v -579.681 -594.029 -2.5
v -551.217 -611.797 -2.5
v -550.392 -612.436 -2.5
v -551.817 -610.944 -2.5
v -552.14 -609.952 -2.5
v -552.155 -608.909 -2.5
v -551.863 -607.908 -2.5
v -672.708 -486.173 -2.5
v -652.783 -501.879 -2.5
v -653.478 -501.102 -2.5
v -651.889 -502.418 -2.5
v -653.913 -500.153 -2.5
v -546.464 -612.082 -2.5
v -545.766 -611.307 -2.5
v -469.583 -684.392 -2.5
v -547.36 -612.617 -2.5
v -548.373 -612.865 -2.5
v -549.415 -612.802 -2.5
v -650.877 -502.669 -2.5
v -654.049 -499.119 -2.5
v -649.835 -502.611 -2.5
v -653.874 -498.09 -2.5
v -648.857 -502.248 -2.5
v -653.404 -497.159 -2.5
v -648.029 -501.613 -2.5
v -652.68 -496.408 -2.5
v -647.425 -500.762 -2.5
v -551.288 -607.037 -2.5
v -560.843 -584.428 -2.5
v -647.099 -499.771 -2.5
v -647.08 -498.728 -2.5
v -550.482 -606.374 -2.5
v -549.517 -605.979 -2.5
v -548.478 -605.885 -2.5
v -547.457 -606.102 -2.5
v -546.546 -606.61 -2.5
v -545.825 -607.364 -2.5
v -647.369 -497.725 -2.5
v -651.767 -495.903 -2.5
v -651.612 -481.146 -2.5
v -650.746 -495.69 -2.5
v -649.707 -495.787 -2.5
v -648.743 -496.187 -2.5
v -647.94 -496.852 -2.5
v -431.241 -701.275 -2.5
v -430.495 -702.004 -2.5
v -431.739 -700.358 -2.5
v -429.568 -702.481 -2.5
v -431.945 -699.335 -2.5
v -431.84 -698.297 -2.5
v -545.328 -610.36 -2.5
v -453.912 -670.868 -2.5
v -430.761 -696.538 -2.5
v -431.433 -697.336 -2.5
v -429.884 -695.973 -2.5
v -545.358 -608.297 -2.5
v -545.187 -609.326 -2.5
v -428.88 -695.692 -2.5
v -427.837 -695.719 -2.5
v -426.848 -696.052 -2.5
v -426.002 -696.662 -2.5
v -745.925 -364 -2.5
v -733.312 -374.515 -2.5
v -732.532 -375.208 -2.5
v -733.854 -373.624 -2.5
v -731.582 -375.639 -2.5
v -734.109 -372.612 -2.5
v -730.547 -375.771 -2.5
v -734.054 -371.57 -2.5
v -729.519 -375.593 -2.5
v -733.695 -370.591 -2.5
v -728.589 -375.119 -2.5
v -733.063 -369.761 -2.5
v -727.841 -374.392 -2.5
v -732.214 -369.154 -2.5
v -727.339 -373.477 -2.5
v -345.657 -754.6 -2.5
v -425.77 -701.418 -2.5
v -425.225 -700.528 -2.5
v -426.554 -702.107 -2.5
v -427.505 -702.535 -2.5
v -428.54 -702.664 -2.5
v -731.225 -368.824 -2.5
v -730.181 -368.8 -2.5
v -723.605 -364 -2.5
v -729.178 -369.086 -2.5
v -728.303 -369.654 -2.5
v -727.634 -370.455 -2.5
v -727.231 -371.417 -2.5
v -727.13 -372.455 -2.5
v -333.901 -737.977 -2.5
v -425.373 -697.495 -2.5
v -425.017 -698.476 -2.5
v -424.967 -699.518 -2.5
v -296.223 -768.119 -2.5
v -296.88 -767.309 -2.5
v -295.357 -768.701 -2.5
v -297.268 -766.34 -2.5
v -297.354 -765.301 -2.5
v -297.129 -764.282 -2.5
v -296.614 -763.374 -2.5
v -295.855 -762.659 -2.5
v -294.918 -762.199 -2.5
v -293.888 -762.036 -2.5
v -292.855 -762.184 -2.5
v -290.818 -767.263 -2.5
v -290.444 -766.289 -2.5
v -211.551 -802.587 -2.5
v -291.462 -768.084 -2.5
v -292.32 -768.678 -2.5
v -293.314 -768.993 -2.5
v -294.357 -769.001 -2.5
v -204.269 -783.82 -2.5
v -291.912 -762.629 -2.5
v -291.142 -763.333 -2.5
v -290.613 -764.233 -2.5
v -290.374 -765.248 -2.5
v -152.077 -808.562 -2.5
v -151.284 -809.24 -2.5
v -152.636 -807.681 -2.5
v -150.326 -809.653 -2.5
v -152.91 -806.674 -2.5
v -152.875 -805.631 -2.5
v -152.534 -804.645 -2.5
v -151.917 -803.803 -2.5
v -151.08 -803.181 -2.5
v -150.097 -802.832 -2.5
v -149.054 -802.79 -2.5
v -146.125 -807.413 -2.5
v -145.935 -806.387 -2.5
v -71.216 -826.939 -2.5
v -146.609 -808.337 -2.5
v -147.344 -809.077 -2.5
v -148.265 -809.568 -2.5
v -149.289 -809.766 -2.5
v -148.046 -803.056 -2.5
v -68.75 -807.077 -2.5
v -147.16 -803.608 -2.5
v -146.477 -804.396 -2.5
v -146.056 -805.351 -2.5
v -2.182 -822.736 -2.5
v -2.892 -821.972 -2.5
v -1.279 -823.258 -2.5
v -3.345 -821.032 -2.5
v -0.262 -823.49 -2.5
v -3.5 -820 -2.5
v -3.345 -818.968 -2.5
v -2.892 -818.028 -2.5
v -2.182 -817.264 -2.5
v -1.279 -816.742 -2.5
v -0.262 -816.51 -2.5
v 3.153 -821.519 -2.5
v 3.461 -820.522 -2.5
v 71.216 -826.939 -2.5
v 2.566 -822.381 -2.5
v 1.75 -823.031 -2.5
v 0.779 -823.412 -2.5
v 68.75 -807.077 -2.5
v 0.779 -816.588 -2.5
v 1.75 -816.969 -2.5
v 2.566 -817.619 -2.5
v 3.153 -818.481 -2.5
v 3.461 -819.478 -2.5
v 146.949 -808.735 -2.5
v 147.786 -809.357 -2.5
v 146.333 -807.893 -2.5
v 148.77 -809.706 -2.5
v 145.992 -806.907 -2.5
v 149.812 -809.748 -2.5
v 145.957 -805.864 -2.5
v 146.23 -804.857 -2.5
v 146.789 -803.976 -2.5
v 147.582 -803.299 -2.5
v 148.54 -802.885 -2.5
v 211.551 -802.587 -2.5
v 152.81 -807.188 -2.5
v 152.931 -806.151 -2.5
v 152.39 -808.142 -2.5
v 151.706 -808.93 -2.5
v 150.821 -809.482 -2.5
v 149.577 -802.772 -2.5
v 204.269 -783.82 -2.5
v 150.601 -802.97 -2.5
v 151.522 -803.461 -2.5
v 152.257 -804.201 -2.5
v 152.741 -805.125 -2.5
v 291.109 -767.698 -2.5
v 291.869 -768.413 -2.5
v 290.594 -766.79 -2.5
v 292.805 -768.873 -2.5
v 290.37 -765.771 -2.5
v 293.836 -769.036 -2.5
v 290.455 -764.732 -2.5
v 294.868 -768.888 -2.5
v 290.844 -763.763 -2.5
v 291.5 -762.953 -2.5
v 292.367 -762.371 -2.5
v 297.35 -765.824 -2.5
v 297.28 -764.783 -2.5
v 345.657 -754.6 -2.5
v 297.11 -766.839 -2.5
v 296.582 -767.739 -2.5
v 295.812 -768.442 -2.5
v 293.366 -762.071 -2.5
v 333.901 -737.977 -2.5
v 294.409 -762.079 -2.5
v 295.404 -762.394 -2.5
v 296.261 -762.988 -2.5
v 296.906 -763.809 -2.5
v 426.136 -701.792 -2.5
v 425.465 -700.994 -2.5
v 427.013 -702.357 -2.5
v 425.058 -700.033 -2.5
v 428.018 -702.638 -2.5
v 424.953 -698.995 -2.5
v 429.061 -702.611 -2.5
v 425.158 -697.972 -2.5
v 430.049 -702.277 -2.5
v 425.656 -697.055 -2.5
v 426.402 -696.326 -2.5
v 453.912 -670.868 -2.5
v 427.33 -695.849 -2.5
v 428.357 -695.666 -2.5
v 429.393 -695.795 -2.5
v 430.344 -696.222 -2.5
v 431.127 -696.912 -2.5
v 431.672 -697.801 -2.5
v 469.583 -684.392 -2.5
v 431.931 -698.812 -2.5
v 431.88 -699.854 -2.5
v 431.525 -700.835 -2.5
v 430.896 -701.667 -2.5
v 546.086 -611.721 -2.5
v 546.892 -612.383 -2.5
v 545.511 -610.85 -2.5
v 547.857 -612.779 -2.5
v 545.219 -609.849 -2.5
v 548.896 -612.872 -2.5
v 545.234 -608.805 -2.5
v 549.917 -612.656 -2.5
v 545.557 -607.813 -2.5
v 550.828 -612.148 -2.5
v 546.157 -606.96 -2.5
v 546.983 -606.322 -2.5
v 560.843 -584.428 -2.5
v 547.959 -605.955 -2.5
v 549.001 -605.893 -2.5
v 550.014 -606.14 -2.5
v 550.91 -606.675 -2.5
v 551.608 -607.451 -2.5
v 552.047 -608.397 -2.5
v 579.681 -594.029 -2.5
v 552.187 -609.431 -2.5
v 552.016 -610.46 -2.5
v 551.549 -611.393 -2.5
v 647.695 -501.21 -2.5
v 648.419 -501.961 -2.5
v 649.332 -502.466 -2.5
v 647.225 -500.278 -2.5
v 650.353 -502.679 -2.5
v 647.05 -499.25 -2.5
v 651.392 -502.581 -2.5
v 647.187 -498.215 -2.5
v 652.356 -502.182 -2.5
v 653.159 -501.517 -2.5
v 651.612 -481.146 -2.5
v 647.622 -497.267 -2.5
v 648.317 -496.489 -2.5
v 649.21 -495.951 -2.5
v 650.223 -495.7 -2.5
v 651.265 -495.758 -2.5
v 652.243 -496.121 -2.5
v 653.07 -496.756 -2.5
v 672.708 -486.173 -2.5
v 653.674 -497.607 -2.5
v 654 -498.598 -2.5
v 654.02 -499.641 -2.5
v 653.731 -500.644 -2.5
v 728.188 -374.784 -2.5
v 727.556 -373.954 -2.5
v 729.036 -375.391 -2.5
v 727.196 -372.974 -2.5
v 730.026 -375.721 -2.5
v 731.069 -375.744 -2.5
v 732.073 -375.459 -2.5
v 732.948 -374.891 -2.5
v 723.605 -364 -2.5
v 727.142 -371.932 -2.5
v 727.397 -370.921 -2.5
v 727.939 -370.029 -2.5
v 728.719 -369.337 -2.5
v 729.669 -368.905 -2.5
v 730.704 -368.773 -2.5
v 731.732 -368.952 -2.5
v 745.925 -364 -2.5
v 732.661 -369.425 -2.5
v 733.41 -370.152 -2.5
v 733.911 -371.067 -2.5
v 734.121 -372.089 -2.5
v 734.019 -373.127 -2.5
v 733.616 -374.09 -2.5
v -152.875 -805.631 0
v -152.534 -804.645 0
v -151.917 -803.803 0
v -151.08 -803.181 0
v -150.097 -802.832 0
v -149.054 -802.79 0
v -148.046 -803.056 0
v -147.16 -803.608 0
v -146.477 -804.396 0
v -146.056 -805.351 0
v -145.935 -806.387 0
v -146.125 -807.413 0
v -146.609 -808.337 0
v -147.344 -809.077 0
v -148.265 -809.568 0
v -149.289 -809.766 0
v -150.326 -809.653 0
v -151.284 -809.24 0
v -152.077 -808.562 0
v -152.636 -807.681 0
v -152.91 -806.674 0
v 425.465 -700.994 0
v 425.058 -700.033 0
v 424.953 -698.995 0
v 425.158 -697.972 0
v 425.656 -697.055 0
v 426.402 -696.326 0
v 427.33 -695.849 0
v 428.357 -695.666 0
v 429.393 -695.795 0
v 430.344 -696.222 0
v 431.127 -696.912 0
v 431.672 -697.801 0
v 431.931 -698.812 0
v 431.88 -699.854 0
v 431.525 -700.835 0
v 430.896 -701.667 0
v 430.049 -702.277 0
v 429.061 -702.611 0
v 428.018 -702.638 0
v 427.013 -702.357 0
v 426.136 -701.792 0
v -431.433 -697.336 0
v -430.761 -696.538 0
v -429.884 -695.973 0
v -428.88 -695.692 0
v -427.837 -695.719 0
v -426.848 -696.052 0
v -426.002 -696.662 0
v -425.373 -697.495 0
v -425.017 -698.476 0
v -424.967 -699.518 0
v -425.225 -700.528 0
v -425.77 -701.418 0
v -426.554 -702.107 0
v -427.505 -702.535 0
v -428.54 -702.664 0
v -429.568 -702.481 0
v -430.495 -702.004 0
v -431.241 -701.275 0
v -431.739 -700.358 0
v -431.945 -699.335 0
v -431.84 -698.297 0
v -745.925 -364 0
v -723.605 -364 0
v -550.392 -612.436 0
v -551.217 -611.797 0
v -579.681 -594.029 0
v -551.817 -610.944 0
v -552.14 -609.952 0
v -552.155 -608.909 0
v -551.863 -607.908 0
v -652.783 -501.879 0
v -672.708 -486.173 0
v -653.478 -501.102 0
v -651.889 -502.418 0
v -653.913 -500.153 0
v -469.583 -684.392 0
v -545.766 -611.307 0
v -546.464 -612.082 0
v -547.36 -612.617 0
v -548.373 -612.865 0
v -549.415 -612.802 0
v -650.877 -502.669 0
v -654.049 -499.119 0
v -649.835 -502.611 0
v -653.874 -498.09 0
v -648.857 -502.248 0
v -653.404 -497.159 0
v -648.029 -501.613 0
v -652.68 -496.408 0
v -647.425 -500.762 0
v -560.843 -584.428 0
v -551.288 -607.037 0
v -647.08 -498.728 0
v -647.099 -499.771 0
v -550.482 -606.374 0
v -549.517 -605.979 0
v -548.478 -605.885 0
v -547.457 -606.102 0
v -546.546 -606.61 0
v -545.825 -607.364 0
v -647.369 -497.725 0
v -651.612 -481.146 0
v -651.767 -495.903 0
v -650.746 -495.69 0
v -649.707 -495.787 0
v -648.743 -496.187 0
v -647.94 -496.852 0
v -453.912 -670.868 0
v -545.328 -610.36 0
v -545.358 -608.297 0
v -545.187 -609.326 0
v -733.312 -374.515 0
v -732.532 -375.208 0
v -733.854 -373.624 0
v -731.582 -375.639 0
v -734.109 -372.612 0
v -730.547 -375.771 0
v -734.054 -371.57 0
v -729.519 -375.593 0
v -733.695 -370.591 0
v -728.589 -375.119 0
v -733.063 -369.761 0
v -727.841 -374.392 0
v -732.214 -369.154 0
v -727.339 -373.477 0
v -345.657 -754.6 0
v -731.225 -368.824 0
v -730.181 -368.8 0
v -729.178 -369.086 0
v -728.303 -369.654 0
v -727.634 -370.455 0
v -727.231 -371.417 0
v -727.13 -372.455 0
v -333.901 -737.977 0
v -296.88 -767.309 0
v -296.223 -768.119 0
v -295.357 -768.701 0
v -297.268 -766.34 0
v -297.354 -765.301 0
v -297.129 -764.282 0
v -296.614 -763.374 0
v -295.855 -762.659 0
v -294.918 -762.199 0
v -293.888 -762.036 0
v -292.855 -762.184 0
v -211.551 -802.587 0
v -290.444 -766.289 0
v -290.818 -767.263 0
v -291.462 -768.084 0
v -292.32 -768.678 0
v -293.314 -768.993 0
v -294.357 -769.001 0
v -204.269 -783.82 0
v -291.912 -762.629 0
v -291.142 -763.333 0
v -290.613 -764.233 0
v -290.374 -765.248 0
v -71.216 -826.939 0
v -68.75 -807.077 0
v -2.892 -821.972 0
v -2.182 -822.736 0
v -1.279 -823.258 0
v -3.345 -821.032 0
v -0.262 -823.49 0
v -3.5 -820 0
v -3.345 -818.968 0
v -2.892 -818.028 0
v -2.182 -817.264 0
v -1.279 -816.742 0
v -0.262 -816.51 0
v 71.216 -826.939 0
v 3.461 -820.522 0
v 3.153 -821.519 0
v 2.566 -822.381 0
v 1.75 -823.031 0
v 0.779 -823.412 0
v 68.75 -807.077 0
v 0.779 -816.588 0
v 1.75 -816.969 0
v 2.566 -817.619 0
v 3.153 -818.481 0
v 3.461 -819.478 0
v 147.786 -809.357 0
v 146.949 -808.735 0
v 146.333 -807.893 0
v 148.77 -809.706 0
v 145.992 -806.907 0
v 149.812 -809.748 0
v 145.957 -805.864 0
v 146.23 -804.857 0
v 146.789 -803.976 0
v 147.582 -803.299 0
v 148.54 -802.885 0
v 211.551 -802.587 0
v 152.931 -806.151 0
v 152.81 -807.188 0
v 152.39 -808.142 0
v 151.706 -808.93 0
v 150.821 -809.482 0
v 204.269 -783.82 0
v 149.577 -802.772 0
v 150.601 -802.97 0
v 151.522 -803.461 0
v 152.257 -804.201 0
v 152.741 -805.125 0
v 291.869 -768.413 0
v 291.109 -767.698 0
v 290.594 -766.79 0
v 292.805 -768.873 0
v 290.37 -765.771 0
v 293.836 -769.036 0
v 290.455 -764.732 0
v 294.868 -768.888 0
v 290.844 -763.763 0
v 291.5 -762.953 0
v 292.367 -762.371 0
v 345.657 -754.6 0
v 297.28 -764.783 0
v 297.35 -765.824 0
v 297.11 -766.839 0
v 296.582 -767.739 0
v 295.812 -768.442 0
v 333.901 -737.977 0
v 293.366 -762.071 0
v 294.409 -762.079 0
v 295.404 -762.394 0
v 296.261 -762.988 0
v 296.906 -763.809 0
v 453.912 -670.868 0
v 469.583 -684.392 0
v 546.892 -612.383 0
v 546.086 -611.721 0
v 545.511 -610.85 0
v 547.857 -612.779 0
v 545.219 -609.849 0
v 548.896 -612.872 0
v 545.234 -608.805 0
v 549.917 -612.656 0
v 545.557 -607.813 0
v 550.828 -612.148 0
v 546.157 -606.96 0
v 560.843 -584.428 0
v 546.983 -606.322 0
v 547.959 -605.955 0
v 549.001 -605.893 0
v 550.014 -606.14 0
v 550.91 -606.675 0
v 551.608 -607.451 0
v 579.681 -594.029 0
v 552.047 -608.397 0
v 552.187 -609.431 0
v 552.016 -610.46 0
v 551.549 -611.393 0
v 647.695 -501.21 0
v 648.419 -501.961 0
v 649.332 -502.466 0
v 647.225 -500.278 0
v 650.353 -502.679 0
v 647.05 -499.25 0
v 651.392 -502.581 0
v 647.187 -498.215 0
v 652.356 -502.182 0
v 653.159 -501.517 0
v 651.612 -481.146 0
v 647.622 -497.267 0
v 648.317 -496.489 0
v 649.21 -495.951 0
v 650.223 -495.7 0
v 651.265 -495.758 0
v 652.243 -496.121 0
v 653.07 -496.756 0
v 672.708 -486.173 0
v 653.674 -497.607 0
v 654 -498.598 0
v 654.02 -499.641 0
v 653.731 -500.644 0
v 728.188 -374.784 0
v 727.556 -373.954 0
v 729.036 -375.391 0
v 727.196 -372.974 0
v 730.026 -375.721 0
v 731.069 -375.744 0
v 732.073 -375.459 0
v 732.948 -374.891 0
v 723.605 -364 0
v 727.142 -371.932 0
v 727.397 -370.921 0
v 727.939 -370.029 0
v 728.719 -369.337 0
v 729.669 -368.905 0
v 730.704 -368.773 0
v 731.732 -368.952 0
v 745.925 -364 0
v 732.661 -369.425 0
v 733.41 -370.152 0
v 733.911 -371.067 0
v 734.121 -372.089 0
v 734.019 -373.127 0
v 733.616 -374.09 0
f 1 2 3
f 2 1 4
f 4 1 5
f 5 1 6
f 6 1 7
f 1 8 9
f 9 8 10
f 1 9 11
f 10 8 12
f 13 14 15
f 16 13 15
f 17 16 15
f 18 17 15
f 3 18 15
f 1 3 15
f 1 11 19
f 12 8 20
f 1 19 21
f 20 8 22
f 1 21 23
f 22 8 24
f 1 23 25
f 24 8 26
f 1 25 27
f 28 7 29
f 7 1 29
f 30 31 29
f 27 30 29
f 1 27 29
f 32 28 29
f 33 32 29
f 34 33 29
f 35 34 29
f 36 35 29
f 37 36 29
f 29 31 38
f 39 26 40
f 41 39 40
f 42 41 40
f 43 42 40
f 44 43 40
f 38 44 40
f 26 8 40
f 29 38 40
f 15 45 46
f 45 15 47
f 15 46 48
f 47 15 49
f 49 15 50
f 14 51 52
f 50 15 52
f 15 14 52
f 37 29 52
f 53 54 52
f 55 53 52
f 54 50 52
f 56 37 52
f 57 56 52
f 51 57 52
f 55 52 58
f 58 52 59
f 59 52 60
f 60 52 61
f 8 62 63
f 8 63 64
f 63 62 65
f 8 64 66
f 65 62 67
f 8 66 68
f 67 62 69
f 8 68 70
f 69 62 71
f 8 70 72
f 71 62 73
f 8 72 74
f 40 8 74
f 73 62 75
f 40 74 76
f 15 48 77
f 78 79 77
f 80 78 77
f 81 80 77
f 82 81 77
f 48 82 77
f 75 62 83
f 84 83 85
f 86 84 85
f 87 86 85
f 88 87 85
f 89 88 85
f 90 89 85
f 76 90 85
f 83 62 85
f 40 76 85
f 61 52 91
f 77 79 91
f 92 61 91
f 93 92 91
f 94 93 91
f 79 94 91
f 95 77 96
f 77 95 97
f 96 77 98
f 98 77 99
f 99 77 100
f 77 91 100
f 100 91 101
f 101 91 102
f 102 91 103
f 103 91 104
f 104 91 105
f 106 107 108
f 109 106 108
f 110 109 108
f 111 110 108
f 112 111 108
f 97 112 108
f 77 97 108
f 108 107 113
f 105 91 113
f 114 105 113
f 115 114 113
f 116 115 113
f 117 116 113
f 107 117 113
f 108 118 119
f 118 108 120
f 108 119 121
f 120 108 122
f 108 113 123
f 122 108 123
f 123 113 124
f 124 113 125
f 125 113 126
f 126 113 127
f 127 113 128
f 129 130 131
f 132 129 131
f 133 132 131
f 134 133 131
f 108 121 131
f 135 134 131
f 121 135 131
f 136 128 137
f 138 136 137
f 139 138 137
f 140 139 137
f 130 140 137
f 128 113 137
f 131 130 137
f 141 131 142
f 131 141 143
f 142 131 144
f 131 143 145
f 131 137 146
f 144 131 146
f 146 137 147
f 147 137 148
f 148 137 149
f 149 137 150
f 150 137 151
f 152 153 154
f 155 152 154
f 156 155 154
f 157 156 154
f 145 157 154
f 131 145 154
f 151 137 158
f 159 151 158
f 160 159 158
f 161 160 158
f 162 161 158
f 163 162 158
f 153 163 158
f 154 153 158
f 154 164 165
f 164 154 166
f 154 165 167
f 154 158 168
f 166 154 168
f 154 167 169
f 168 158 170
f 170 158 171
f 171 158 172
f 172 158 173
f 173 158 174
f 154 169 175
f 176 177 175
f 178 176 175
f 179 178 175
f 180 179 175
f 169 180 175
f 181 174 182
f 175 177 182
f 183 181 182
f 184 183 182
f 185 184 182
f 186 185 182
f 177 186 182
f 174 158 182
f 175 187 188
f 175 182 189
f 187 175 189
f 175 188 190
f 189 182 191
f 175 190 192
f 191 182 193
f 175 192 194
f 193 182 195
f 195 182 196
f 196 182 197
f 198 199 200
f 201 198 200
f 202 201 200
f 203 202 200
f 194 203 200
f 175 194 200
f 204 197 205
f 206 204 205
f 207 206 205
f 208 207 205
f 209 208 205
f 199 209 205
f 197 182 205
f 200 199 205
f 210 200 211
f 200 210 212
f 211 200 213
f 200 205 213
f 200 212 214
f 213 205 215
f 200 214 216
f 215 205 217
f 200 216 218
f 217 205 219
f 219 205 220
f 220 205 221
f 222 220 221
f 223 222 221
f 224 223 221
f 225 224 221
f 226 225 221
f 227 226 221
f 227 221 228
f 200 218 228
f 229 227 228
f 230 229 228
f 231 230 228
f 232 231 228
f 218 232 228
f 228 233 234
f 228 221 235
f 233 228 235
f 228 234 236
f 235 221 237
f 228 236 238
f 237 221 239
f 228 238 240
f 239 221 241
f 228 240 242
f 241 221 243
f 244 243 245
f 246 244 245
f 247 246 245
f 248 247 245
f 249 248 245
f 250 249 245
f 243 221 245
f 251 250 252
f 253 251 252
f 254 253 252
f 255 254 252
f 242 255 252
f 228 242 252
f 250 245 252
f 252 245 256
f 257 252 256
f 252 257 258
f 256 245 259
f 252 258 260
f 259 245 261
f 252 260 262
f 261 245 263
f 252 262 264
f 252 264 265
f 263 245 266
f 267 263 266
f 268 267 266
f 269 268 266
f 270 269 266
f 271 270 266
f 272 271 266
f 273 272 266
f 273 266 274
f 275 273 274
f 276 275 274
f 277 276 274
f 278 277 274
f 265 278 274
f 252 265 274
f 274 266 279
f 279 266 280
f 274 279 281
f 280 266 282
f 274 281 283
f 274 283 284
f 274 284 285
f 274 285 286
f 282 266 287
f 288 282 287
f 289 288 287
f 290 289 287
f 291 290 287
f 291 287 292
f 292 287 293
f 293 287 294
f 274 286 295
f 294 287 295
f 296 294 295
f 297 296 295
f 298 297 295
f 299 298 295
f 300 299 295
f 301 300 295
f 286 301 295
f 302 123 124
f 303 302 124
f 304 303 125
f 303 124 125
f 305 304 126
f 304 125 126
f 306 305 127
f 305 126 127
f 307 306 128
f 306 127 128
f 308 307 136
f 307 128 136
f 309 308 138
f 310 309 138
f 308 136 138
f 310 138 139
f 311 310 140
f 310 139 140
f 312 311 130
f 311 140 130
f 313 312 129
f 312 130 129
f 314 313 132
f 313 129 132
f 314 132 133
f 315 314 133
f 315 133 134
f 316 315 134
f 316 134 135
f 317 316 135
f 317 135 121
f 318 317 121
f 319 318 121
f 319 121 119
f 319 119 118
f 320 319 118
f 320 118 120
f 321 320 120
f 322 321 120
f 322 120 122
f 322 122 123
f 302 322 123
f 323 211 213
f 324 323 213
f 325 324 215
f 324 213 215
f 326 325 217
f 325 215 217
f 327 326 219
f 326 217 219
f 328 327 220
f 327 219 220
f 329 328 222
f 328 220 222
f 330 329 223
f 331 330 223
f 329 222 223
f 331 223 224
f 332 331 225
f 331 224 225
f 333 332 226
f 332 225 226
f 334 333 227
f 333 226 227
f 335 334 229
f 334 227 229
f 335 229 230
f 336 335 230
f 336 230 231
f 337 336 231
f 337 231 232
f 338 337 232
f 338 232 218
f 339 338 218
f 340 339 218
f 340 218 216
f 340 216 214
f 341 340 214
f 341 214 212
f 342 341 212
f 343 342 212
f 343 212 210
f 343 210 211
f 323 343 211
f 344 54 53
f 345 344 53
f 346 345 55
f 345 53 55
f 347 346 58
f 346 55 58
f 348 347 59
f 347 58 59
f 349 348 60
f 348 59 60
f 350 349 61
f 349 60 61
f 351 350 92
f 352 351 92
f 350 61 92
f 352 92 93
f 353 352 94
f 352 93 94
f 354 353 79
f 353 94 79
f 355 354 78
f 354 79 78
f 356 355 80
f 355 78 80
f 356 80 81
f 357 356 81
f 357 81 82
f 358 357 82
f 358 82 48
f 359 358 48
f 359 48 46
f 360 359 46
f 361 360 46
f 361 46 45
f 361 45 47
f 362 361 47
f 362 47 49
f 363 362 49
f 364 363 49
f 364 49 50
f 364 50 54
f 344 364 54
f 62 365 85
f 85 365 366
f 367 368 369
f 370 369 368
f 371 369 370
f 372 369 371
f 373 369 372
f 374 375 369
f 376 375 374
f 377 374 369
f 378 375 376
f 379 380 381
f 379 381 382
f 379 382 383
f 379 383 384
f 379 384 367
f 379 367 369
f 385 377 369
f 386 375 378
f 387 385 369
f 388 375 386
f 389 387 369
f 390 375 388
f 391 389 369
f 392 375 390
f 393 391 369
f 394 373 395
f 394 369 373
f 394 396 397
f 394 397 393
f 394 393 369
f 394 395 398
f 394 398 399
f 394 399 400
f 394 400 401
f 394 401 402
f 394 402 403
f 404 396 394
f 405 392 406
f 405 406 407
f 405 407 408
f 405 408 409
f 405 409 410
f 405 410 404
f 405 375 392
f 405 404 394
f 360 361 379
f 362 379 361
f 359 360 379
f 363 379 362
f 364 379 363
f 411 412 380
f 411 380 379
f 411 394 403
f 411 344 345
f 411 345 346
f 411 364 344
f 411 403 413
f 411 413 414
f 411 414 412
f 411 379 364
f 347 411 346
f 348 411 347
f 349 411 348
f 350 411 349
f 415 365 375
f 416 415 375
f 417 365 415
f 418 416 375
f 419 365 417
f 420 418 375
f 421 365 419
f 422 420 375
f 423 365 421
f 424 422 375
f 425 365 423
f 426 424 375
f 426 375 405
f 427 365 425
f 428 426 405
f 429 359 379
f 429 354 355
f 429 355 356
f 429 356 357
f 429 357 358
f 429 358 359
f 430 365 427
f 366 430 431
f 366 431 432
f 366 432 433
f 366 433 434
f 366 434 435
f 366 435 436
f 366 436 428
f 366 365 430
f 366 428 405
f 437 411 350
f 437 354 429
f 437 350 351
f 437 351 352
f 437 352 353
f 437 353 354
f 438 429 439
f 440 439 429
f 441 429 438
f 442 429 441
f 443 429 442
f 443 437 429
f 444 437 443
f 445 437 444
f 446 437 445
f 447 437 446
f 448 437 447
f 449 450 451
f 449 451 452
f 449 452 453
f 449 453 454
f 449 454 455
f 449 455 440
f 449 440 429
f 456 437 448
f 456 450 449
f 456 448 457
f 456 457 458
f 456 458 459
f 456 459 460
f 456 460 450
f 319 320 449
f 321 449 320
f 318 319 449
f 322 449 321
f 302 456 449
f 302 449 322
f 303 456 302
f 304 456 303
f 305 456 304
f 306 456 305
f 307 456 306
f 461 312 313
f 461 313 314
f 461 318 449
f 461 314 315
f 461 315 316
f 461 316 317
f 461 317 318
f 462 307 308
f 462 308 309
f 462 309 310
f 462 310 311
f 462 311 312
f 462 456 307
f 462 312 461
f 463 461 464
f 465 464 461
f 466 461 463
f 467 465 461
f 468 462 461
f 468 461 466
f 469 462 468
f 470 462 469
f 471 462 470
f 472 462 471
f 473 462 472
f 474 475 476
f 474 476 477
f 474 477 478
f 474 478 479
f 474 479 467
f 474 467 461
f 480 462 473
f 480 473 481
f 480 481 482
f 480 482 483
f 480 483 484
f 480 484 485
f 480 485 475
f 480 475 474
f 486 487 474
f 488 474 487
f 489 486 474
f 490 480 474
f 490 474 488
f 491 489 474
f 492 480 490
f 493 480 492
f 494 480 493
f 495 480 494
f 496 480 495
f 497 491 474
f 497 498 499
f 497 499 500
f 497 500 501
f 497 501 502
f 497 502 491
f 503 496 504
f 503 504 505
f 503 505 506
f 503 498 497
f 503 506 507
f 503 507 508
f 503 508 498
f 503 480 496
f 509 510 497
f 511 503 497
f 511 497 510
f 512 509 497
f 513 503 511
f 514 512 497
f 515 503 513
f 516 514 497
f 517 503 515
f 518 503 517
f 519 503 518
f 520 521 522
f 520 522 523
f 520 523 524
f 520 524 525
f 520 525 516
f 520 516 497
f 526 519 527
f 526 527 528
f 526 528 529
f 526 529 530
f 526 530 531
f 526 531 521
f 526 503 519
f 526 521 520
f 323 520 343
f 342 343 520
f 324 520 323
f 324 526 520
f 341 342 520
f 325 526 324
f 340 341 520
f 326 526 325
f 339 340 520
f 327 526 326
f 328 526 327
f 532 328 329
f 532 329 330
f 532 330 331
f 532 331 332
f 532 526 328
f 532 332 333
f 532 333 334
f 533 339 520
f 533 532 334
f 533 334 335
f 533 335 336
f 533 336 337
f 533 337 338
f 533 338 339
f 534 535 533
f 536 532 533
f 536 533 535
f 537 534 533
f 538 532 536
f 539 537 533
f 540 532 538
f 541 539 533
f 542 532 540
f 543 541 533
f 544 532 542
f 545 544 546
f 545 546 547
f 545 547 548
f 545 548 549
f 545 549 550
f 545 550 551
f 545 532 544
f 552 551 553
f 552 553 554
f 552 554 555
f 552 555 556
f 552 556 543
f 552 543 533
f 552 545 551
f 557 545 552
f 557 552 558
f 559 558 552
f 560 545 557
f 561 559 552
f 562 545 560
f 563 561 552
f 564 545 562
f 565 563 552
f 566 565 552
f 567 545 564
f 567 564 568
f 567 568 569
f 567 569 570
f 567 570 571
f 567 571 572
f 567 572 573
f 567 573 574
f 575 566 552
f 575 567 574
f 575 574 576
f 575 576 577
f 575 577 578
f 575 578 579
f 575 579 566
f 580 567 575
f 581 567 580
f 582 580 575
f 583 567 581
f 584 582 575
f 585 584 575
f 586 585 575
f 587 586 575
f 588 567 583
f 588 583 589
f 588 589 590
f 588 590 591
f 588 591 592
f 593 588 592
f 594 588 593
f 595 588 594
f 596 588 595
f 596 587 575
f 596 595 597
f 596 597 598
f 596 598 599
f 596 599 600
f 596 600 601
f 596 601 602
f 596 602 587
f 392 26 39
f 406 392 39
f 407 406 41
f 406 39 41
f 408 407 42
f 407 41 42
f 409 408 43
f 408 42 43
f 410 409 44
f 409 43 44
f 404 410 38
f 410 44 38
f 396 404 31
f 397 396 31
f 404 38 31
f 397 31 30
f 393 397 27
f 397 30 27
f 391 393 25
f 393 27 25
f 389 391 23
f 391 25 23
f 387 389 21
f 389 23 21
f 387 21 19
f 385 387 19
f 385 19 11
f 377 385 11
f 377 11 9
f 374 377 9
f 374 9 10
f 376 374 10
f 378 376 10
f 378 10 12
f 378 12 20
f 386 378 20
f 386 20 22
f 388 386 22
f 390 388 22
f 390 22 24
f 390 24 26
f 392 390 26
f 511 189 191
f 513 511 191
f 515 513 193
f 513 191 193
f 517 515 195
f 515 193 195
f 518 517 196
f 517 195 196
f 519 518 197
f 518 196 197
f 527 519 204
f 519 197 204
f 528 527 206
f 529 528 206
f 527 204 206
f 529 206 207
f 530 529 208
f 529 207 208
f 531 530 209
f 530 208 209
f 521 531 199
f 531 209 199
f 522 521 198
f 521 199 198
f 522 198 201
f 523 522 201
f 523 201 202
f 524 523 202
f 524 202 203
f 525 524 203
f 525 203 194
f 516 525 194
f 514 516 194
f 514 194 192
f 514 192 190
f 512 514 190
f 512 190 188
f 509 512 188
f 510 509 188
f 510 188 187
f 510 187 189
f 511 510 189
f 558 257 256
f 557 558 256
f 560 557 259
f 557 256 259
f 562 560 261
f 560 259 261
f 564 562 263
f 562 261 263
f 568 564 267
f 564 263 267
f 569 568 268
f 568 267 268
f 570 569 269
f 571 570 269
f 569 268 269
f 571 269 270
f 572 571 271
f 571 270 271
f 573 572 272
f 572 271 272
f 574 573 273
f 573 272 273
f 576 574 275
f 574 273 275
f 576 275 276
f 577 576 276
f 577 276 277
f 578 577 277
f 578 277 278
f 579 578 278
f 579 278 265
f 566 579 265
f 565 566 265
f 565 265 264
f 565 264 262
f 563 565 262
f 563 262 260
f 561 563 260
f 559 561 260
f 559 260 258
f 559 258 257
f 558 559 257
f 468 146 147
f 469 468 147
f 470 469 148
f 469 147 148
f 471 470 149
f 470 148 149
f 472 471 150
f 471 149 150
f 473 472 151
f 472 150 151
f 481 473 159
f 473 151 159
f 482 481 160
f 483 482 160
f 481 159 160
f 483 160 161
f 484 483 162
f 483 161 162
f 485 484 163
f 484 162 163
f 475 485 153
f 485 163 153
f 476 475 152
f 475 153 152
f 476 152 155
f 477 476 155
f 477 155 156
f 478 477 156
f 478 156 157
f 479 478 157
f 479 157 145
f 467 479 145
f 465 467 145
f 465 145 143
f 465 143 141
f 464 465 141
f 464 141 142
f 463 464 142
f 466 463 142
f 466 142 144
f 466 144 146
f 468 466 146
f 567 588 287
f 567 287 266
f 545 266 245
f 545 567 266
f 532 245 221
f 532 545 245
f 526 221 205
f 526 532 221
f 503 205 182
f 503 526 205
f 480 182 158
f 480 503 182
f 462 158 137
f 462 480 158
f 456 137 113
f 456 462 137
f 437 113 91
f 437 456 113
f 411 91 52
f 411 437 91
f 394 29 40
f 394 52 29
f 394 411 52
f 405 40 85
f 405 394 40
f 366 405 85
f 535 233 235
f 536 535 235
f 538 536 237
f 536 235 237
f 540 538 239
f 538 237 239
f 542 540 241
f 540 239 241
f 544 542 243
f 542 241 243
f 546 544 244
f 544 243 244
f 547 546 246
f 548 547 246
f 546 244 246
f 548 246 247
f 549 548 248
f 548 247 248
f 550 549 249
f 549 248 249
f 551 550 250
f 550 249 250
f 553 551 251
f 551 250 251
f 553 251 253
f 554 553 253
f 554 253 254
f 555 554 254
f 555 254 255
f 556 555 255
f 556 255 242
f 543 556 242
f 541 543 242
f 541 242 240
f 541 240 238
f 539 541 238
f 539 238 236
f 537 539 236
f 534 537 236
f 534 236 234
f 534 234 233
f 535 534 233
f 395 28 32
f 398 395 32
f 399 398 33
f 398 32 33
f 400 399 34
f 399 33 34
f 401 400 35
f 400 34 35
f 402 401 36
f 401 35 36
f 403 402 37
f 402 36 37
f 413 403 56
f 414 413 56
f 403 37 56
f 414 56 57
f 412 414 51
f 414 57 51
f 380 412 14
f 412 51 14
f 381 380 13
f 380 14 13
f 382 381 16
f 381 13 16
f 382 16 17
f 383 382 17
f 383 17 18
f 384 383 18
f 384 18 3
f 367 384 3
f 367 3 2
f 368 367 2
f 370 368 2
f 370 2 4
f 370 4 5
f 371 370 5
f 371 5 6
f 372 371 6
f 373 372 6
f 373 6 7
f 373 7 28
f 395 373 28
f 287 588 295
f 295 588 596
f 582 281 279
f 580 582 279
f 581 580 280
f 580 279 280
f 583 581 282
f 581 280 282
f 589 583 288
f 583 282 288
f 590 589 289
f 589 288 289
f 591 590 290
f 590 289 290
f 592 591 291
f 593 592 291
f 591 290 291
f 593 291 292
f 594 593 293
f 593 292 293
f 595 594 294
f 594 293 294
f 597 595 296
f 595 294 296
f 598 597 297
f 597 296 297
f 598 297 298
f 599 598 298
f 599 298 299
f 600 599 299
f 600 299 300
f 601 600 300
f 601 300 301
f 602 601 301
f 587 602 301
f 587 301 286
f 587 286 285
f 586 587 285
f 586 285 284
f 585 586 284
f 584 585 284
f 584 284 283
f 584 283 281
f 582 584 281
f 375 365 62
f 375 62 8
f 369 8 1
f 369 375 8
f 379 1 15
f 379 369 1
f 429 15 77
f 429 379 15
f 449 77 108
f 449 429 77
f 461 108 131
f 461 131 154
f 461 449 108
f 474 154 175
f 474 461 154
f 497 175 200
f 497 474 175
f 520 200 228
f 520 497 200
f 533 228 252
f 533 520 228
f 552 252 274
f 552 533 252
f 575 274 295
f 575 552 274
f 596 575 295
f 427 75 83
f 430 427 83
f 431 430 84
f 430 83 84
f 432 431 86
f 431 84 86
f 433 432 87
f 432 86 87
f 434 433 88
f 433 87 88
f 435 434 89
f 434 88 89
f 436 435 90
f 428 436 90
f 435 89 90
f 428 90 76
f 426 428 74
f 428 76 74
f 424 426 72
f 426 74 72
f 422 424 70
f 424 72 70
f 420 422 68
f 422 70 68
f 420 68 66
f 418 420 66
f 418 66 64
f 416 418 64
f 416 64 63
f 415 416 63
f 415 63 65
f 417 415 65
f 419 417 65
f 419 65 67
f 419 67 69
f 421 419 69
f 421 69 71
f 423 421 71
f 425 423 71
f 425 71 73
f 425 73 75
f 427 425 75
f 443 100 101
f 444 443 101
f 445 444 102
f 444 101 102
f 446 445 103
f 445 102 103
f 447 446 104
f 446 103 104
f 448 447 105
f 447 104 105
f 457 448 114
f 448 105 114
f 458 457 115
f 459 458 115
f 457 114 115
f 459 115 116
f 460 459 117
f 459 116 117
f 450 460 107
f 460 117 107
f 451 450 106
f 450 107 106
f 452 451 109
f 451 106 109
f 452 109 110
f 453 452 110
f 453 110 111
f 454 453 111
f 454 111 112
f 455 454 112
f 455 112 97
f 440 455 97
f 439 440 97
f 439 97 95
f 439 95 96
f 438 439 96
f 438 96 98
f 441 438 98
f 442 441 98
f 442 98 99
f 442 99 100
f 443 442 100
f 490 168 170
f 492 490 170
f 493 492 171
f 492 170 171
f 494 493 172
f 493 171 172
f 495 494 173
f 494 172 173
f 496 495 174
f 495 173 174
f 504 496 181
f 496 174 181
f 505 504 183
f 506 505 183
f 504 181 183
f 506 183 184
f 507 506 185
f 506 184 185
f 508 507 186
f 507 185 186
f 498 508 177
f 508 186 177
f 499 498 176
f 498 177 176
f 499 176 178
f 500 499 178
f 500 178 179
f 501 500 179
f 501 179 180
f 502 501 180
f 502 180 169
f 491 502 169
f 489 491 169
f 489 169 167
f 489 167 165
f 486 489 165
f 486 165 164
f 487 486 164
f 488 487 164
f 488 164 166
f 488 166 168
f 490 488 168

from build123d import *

# Parameters (mm, degrees)
BASE_FLANGE1_DEPTH              = 2.5
SKETCH2_W                       = 1968.518691842
SKETCH2_H                       = 782.123286761
CUT_EXTRUDE1_DEPTH              = 10
CUT_EXTRUDE3_DEPTH              = 10
SKETCH10_R                      = 3.5
CUT_EXTRUDE4_DEPTH              = 10
CIRPATTERN1_COUNT               = 10
CIRPATTERN1_ANGLE               = 94.5
CIRPATTERN1_THE_OTHER_WAY_COUNT = 10
CIRPATTERN1_THE_OTHER_WAY_ANGLE = 94.5


# Sheet-metal steps are written as plain solids
with BuildPart() as part:
    # Sketch1 → Base-Flange1 (new body)
    with BuildSketch(Plane.XY):
        with BuildLine():
            Line((829.984939622, -5), (-829.984939622, -5))
            ThreePointArc((-829.984939622, -5), (0, -830), (829.984939622, -5))
        make_face()
    extrude(amount=-BASE_FLANGE1_DEPTH)

    # Sketch2 → Cut-Extrude1 (cut)
    with BuildSketch(Plane.XY):
        with Locations((10.387961435, 27.061643381)):
            Rectangle(SKETCH2_W, SKETCH2_H)
    extrude(amount=-CUT_EXTRUDE1_DEPTH, mode=Mode.SUBTRACT)

    # Sketch9 → Cut-Extrude3 (cut)
    with BuildSketch(Plane.XY):
        with BuildLine():
            Line((-723.60486455, -364), (723.60486455, -364))
            ThreePointArc((723.60486455, -364), (0, -810), (-723.60486455, -364))
        make_face()
    extrude(amount=-CUT_EXTRUDE3_DEPTH, mode=Mode.SUBTRACT)

    # Sketch10 → Cut-Extrude4 (cut)
    with BuildSketch(Plane(origin=(0, 0, -2.5), x_dir=(-1, 0, 0), z_dir=(0, 0, -1))):
        with Locations((0, -820)):
            Circle(SKETCH10_R)
    cut_extrude4 = extrude(amount=-CUT_EXTRUDE4_DEPTH, mode=Mode.SUBTRACT)

    # CirPattern1: Cut-Extrude4 ×10 about axis
    cirpattern1_axis = Axis((0, 0, 0), (0, 0, 1))
    for i in range(1, CIRPATTERN1_COUNT):
        add(cut_extrude4.rotate(cirpattern1_axis, i * CIRPATTERN1_ANGLE / (CIRPATTERN1_COUNT - 1)), mode=Mode.SUBTRACT)

    # CirPattern1 the other way: Cut-Extrude4 ×10 about axis
    cirpattern1_the_other_way_axis = Axis((0, 0, 0), (0, 0, -1))
    for i in range(1, CIRPATTERN1_THE_OTHER_WAY_COUNT):
        add(cut_extrude4.rotate(cirpattern1_the_other_way_axis, i * CIRPATTERN1_THE_OTHER_WAY_ANGLE / (CIRPATTERN1_THE_OTHER_WAY_COUNT - 1)), mode=Mode.SUBTRACT)


solid = part.part
